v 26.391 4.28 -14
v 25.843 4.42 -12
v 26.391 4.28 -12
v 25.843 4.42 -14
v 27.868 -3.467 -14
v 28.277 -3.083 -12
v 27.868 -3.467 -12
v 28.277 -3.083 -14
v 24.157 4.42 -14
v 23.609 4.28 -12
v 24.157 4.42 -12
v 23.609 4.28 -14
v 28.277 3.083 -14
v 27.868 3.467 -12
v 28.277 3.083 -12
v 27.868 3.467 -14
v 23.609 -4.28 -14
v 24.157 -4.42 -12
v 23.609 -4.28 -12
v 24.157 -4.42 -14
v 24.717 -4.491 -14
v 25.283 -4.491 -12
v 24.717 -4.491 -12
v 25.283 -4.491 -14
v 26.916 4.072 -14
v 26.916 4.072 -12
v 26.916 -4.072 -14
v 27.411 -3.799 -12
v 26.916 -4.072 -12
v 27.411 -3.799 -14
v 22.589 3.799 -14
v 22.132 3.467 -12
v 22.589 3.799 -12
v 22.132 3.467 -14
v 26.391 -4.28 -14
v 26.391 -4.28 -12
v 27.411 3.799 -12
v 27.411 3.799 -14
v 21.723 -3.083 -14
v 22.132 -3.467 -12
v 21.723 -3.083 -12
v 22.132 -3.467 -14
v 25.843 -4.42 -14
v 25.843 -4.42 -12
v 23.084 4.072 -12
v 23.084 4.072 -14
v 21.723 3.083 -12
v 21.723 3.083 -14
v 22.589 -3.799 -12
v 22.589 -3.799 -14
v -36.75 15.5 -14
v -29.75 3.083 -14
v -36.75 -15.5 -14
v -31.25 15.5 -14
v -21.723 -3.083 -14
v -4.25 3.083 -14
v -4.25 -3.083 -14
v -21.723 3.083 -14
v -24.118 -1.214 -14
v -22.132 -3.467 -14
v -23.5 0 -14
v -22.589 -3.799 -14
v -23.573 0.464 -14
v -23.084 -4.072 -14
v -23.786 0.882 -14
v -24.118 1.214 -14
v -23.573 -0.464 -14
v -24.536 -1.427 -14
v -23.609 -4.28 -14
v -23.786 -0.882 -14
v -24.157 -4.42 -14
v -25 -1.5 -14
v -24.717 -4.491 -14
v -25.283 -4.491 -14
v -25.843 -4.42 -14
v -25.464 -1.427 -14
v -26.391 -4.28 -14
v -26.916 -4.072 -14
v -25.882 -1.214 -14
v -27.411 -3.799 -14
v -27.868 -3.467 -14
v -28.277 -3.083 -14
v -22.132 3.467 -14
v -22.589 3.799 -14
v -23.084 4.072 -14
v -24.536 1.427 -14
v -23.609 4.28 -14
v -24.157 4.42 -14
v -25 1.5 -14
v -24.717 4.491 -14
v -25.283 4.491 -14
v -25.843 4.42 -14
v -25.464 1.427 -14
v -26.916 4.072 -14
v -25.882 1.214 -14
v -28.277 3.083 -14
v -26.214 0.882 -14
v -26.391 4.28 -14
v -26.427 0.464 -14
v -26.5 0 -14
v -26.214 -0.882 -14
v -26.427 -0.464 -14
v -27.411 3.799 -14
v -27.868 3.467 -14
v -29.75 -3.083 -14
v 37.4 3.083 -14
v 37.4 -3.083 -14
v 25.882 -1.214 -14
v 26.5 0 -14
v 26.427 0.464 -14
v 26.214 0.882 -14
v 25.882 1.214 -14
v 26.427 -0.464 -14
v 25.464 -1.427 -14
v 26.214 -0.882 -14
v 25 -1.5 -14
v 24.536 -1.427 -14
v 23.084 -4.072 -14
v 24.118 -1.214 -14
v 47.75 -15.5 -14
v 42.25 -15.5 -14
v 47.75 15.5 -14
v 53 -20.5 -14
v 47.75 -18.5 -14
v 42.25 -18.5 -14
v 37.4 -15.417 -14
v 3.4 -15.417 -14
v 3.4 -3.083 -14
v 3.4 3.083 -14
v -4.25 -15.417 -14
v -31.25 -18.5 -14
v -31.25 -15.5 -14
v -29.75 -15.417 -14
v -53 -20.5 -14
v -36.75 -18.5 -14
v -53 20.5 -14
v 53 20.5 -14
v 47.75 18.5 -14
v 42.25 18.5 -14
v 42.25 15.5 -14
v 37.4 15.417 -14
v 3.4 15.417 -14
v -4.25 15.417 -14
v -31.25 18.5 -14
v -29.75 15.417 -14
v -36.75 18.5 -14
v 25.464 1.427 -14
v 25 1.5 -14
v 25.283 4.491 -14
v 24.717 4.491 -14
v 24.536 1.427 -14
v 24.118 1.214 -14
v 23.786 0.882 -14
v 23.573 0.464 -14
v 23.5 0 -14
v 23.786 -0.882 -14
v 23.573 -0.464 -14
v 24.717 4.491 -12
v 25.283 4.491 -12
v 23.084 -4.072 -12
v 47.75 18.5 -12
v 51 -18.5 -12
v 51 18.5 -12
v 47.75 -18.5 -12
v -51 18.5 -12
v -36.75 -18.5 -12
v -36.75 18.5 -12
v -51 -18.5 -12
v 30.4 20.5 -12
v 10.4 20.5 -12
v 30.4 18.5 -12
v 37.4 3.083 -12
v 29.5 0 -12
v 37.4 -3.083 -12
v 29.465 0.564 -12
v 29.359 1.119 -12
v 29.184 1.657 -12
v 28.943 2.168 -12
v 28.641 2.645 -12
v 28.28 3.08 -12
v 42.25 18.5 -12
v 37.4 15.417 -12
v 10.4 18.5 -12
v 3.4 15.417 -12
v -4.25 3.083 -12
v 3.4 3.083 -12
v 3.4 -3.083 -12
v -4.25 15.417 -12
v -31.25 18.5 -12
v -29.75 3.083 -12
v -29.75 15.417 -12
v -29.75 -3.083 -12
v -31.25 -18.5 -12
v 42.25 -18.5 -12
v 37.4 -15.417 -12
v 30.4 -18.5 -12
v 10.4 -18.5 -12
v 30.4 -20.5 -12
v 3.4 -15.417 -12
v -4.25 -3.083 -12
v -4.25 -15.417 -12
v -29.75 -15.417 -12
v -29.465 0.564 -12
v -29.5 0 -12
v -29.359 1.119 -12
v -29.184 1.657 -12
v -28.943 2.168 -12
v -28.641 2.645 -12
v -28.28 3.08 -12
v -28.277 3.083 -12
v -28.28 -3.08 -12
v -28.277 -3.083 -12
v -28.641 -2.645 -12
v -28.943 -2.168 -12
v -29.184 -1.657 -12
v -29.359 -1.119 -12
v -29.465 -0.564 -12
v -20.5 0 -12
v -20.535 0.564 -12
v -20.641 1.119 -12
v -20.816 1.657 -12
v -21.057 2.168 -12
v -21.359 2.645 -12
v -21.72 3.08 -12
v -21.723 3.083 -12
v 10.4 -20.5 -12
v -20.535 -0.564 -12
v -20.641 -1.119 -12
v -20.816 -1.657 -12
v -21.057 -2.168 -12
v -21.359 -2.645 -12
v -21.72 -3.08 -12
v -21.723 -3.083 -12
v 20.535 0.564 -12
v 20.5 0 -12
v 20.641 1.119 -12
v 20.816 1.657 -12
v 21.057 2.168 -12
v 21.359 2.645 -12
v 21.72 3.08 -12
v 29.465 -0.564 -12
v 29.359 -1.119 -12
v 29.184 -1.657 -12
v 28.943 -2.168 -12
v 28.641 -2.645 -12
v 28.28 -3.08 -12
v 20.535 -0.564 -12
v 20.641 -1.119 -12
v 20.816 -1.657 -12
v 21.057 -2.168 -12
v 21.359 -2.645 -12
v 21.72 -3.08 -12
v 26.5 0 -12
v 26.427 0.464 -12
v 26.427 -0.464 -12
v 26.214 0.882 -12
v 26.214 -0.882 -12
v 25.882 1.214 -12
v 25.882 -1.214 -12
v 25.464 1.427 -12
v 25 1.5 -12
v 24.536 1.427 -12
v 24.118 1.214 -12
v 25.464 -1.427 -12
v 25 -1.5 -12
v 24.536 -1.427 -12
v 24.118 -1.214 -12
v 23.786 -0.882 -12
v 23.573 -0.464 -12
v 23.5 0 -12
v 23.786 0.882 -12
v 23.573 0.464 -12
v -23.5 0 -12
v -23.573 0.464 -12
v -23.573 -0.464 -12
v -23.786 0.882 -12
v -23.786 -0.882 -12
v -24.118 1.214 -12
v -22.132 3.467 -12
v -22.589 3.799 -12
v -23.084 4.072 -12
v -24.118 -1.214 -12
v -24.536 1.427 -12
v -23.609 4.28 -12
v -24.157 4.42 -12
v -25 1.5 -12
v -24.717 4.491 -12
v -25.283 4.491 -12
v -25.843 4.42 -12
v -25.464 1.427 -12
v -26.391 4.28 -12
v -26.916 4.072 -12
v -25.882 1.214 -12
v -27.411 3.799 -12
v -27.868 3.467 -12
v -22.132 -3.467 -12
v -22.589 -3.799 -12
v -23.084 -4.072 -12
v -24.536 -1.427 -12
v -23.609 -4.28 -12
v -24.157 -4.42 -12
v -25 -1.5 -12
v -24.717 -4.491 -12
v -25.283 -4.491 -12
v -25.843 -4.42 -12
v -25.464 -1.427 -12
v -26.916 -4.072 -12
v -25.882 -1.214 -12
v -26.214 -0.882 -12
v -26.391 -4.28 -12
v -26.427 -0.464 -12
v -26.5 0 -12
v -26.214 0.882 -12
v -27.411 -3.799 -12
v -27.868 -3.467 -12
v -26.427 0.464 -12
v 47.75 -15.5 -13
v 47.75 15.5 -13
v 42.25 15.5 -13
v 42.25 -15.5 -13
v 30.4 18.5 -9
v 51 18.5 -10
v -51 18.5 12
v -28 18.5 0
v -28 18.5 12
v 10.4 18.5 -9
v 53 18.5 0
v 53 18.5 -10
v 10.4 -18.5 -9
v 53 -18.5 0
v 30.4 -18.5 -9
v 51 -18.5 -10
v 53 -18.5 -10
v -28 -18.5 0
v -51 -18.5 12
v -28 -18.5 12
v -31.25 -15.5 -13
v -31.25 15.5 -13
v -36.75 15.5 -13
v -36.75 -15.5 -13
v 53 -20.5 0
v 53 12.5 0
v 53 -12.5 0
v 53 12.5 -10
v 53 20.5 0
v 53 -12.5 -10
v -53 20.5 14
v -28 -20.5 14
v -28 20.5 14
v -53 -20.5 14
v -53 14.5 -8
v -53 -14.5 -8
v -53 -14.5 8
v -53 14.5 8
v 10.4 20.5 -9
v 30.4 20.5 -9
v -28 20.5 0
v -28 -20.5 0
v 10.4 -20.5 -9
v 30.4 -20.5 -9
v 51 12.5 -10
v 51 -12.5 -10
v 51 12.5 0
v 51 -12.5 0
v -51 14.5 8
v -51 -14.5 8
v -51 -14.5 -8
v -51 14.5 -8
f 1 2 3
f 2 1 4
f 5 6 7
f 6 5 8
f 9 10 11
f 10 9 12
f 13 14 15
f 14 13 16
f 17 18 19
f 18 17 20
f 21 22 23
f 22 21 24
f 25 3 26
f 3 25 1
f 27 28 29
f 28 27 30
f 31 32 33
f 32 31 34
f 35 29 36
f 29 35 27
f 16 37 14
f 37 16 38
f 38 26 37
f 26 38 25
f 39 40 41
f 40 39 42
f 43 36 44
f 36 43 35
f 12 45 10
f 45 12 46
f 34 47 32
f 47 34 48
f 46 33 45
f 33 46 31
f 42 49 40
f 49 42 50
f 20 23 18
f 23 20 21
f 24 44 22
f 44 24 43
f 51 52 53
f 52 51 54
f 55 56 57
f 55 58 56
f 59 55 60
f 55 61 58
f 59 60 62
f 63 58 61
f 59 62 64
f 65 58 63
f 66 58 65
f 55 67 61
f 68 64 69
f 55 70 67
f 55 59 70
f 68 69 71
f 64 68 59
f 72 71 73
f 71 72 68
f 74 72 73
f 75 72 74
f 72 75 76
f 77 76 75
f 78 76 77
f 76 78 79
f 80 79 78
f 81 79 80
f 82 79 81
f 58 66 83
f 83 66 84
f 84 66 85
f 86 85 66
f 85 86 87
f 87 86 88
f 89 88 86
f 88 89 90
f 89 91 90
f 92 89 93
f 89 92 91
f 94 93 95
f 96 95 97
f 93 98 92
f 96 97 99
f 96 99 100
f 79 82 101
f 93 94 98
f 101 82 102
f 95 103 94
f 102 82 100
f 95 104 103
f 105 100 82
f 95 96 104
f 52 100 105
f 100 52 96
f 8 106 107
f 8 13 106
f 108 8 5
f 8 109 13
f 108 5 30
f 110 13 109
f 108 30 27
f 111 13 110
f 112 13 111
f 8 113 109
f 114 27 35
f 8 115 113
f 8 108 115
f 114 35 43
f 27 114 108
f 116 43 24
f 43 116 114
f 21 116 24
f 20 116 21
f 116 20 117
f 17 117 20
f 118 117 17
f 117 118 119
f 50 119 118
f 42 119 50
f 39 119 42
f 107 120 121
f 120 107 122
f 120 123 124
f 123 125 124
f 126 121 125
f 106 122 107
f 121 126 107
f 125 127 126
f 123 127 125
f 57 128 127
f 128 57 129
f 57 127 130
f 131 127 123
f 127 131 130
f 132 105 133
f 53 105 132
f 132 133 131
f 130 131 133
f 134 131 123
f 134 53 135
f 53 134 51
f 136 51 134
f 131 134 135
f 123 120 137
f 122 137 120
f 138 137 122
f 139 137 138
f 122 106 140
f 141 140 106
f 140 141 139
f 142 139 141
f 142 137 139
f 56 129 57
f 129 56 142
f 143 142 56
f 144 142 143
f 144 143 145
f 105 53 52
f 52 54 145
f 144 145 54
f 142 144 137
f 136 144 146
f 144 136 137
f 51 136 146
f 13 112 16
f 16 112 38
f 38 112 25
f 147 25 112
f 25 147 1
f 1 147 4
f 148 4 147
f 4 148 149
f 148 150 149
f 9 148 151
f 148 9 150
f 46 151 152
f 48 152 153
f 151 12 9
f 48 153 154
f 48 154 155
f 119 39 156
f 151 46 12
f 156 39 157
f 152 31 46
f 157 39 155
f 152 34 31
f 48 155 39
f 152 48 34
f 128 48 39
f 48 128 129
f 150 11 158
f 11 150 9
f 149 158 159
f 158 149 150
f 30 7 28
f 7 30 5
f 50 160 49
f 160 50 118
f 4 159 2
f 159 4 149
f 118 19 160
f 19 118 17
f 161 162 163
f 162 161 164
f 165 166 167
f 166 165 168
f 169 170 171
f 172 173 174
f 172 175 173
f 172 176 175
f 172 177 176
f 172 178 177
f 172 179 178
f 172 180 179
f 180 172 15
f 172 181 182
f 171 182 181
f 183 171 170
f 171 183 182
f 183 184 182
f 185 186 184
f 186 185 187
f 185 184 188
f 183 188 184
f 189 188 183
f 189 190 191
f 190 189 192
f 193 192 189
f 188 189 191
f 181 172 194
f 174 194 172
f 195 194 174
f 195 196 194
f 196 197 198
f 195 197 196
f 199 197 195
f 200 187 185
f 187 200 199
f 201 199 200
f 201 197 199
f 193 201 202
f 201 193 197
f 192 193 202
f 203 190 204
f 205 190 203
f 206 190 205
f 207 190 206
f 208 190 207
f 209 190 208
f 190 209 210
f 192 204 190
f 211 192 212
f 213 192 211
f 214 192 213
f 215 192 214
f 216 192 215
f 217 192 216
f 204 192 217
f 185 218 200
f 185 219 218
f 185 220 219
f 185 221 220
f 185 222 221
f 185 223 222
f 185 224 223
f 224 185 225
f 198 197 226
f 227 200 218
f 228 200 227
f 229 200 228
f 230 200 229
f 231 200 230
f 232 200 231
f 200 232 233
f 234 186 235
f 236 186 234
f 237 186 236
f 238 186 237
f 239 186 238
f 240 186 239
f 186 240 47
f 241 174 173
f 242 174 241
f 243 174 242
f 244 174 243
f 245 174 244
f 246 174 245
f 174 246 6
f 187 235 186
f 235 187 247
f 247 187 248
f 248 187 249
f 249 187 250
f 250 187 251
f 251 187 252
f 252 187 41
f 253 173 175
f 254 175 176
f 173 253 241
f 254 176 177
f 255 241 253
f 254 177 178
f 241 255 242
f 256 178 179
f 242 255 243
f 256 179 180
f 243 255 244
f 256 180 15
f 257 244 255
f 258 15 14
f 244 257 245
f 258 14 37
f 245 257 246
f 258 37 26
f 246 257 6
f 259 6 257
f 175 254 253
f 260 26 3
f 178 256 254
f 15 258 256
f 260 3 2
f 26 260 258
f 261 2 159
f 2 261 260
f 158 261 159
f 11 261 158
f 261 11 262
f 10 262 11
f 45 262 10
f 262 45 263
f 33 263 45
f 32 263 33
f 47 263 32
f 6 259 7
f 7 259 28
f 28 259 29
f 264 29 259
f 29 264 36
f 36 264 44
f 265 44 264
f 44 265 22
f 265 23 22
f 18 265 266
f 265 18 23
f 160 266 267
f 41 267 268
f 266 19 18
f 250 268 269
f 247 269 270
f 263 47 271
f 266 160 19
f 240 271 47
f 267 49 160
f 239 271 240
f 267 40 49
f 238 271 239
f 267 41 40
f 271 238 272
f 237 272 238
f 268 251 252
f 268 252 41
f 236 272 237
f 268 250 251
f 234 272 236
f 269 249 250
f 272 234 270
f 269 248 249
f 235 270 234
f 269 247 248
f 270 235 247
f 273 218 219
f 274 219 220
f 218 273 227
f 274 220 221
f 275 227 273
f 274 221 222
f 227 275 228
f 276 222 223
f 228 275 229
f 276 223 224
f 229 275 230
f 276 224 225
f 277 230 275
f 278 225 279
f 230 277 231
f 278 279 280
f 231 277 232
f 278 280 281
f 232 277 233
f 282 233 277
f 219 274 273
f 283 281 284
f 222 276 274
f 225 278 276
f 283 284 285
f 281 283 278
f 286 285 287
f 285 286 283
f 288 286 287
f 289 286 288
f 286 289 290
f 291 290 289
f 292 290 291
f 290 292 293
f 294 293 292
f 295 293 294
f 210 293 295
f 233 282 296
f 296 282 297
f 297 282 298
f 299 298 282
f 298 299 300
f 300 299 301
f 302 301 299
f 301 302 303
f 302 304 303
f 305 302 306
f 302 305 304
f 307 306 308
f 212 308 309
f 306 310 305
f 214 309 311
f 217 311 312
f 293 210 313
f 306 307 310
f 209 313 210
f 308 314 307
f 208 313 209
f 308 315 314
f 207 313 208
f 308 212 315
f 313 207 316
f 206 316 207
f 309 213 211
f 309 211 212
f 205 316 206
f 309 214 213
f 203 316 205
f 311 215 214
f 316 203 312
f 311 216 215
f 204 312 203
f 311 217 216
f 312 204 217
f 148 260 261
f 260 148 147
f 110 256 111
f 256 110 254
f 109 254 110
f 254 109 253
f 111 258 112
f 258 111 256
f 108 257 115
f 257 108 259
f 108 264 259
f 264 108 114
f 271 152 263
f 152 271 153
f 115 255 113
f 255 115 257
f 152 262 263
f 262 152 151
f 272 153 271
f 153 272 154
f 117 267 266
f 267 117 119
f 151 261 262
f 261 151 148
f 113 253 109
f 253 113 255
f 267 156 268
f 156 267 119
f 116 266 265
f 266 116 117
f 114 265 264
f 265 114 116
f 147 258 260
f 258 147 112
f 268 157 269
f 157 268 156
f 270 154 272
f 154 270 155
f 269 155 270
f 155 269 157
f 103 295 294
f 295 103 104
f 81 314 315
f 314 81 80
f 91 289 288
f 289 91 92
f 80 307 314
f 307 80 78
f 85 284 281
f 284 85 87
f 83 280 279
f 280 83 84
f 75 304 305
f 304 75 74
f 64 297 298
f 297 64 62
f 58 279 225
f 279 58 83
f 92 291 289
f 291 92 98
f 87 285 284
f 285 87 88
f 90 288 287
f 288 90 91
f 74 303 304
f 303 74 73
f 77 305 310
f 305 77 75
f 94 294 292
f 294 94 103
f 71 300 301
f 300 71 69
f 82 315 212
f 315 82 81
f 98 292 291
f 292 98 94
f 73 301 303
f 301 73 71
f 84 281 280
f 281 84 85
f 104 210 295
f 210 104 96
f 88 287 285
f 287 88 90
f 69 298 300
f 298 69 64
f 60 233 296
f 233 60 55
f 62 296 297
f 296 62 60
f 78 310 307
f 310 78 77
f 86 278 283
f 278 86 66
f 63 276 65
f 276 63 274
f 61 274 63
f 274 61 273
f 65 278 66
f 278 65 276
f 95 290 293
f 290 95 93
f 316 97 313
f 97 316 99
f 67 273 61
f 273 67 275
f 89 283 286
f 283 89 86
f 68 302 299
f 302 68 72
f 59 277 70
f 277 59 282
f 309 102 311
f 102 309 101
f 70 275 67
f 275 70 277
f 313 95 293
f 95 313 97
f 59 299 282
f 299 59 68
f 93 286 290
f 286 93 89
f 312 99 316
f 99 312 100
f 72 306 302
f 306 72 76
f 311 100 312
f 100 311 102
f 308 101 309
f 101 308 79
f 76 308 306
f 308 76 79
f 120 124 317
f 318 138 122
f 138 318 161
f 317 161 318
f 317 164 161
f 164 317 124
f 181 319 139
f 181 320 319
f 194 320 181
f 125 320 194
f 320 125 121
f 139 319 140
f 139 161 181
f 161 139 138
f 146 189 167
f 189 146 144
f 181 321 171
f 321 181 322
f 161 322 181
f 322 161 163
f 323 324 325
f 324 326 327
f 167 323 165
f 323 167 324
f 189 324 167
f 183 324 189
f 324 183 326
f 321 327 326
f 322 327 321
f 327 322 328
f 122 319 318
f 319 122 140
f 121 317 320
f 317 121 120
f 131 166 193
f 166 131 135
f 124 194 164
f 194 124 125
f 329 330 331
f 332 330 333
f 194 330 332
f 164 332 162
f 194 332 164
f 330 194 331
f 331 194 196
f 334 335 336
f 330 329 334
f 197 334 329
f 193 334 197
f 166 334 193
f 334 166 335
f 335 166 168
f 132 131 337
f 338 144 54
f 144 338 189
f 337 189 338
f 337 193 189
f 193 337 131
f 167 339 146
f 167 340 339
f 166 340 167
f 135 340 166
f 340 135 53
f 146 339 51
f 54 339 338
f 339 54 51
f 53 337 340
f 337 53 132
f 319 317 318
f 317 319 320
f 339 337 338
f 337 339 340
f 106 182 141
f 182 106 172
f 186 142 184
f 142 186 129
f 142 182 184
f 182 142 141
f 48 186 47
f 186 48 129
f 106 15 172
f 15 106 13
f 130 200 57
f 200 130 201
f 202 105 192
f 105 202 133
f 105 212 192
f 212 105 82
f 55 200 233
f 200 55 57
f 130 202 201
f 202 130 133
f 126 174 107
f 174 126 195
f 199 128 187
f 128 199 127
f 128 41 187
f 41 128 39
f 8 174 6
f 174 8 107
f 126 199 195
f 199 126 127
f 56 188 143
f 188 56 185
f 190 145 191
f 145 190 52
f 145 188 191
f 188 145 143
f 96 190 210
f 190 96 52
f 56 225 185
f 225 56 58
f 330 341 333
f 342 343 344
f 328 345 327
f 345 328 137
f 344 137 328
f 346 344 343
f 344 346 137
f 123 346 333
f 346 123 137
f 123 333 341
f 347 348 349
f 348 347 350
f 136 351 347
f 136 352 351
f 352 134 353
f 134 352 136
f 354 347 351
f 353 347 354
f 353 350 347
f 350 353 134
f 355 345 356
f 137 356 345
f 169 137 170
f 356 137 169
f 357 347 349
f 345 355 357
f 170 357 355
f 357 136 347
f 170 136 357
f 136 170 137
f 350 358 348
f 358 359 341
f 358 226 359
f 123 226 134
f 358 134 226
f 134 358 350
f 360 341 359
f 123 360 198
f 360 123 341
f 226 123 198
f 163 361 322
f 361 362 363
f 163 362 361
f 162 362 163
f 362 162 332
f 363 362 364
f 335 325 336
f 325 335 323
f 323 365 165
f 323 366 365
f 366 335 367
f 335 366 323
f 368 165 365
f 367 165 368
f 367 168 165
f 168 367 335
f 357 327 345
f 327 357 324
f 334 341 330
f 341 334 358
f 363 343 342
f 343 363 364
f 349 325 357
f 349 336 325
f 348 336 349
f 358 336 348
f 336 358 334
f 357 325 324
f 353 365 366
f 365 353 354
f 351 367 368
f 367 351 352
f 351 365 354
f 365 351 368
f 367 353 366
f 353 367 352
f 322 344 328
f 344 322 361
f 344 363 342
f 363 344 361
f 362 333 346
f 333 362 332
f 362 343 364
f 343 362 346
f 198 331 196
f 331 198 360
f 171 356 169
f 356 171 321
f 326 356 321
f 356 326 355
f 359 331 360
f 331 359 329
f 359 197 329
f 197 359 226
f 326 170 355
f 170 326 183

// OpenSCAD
battery_length=102;
battery_height=24;
battery_width=37;
// high is not be tested it can be it will not fit in!
wall_height=2; // [3:low,2:medium,1.5:!high!]
thickness=2; // [1:3]
hole= 3; // [0:8]
sunk_screws=0; // [0:NO, 1:YES]
// set this to 0 for one hole.
hole_distance=50;
light=1; // [0:NO, 1:YES]
cable_tie_hole=1;// [0:NO, 1:YES]
band_hole=1; // [0:NO, 1:YES]
thick_edge=0; // [0:NO, 1:YES]
//This will only disable wall height and band hole!
hard_case=0; // [0:NO, 1:YES]

module Akku(){
cube([battery_length,battery_width,battery_height],center=true);
}


module Case(L,B,H)
{
difference(){
cube([L,B,H],center=true);
Akku();

if (hard_case==0)
{
if(battery_length > 100)
{
translate([25,0,thickness+battery_height/wall_height]){
cube([L,B+0.5,H],center=true);
}
} else {
translate([battery_length/4,0,thickness+battery_height/wall_height]){
cube([L,B+0.5,H],center=true);
}
}
}

if(light==1)
{
translate([-L/2,0,0])
{
cube([L,battery_width-thickness*4,battery_height-thickness*4],center=true);
}
}



if (hard_case==1)
{
translate([L/2,0,0])
{
cube([L,battery_width,battery_height],center=true);
}
}
translate([L/2,battery_width/2-thickness*1.5,0])
{
cube([L,thickness*3,battery_height-thickness*2],center=true);
}
translate([L/2,-battery_width/2+thickness*1.5,0])
{
cube([L,thickness*3,battery_height-thickness*2],center=true);
}



if(cable_tie_hole==1)
{
translate([battery_length/2-thickness*3,battery_width/2-1.5,-battery_height/2-0.1])
{
cube([5.5,3,thickness*2],center=true);
}
translate([battery_length/2-thickness*3,-battery_width/2+1.5,-battery_height/2-0.1])
{
cube([5.5,3,thickness*2],center=true);
}
translate([-battery_length/3,battery_width/2-1.5,-battery_height/2-0.1])
{
cube([5.5,3,thickness*2],center=true);
}
translate([-battery_length/3,-battery_width/2+1.5,-battery_height/2-0.1])
{
cube([5.5,3,thickness*2],center=true);
}

translate([battery_length/2-thickness*3,0,-battery_height/2])
{
cube([5.5,battery_width,thickness],center=true);
}
translate([-battery_length/3,0,-battery_height/2])
{
cube([5.5,battery_width,thickness],center=true);
}
}





if(thick_edge==1)
{
if(battery_length/5 > 20)
{
translate([battery_length,battery_width/2,0])
{
cube([battery_length+20,thickness*3,battery_height-thickness*2],center=true);
}
translate([battery_length,-battery_width/2,0])
{
cube([battery_length+20,thickness*3,battery_height-thickness*2],center=true);
}
} else{
translate([battery_length,battery_width/2,0])
{
cube([battery_length+battery_length/5,thickness*3,battery_height-thickness*2],center=true);
}
translate([battery_length,-battery_width/2,0])
{
cube([battery_length+battery_length/5,thickness*3,battery_height-thickness*2],center=true);
}
}
}




if (hard_case==0)
{
if(band_hole==1)
{
translate([battery_length/5,0,-battery_height/2+1.5])
{
if(battery_length > 60)
{
cube([20,battery_width+thickness*2+1,3],center=true);
} else {
cube([battery_length/3,battery_width+thickness*2+1,3],center=true);
}
}
}
}

if (hard_case==1)
{
translate([battery_length/2-thickness*3,0,0])
{
cube([3,20,battery_height+20],center=true);
}
}


if(light==1)
{
translate([battery_length/5,battery_width/4,-battery_height/2-0.1])
{
cube([battery_length/3,battery_width/3,thickness*2],center=true);
}
translate([-battery_length/6,-battery_width/4,-battery_height/2-0.1])
{
cube([battery_length/4,battery_width/3,thickness*2],center=true);
}
translate([battery_length/5,-battery_width/4,-battery_height/2-0.1])
{
cube([battery_length/3,battery_width/3,thickness*2],center=true);
}
translate([-battery_length/6,battery_width/4,-battery_height/2-0.1])
{
cube([battery_length/4,battery_width/3,thickness*2],center=true);
}
}


translate([hole_distance/2,0,-battery_height/2-thickness-0.1])
{
cylinder(d=hole,h=thickness+0.5,$fn=20);
}
if(sunk_screws==1)
{
translate([hole_distance/2,0,-battery_height/2-hole/2])
{
cylinder(d1=hole,d2=hole*2,h=hole/2,$fn=20);
}
}
translate([-hole_distance/2,0,-battery_height/2-thickness-0.1])
{
cylinder(d=hole,h=thickness+0.5,$fn=20);
}
if(sunk_screws==1)
{
translate([-hole_distance/2,0,-battery_height/2-hole/2])
{
cylinder(d1=hole,d2=hole*2,h=hole/2,$fn=20);
}
}
}
}


if(hole!=0)
{
difference(){
translate([hole_distance/2,0,-battery_height/2-thickness])
{
cylinder(d=hole+6,h=thickness,$fn=50);
}
translate([hole_distance/2,0,-battery_height/2-thickness-0.1])
{
cylinder(d=hole,h=thickness+0.5,$fn=20);
}
translate([battery_length/2-thickness*3,0,-battery_height/2])
{
cube([5.5,battery_width,thickness],center=true);
}
if(sunk_screws==1)
{
translate([hole_distance/2,0,-battery_height/2-hole/2])
{
cylinder(d1=hole,d2=hole*2,h=hole/2,$fn=20);
}
}
}


difference(){
translate([-hole_distance/2,0,-battery_height/2-thickness])
{
cylinder(d=hole+6,h=thickness,$fn=50);
}
translate([-hole_distance/2,0,-battery_height/2-thickness-0.1])
{
cylinder(d=hole,h=thickness+0.5,$fn=20);
}
translate([-battery_length/3,0,-battery_height/2])
{
cube([5.5,battery_width,thickness],center=true);
}
if(sunk_screws==1)
{
translate([-hole_distance/2,0,-battery_height/2-hole/2])
{
cylinder(d1=hole,d2=hole*2,h=hole/2,$fn=20);
}
}
}
}



Case(battery_length+thickness*2,battery_width+thickness*2,battery_height+thickness*2); 



